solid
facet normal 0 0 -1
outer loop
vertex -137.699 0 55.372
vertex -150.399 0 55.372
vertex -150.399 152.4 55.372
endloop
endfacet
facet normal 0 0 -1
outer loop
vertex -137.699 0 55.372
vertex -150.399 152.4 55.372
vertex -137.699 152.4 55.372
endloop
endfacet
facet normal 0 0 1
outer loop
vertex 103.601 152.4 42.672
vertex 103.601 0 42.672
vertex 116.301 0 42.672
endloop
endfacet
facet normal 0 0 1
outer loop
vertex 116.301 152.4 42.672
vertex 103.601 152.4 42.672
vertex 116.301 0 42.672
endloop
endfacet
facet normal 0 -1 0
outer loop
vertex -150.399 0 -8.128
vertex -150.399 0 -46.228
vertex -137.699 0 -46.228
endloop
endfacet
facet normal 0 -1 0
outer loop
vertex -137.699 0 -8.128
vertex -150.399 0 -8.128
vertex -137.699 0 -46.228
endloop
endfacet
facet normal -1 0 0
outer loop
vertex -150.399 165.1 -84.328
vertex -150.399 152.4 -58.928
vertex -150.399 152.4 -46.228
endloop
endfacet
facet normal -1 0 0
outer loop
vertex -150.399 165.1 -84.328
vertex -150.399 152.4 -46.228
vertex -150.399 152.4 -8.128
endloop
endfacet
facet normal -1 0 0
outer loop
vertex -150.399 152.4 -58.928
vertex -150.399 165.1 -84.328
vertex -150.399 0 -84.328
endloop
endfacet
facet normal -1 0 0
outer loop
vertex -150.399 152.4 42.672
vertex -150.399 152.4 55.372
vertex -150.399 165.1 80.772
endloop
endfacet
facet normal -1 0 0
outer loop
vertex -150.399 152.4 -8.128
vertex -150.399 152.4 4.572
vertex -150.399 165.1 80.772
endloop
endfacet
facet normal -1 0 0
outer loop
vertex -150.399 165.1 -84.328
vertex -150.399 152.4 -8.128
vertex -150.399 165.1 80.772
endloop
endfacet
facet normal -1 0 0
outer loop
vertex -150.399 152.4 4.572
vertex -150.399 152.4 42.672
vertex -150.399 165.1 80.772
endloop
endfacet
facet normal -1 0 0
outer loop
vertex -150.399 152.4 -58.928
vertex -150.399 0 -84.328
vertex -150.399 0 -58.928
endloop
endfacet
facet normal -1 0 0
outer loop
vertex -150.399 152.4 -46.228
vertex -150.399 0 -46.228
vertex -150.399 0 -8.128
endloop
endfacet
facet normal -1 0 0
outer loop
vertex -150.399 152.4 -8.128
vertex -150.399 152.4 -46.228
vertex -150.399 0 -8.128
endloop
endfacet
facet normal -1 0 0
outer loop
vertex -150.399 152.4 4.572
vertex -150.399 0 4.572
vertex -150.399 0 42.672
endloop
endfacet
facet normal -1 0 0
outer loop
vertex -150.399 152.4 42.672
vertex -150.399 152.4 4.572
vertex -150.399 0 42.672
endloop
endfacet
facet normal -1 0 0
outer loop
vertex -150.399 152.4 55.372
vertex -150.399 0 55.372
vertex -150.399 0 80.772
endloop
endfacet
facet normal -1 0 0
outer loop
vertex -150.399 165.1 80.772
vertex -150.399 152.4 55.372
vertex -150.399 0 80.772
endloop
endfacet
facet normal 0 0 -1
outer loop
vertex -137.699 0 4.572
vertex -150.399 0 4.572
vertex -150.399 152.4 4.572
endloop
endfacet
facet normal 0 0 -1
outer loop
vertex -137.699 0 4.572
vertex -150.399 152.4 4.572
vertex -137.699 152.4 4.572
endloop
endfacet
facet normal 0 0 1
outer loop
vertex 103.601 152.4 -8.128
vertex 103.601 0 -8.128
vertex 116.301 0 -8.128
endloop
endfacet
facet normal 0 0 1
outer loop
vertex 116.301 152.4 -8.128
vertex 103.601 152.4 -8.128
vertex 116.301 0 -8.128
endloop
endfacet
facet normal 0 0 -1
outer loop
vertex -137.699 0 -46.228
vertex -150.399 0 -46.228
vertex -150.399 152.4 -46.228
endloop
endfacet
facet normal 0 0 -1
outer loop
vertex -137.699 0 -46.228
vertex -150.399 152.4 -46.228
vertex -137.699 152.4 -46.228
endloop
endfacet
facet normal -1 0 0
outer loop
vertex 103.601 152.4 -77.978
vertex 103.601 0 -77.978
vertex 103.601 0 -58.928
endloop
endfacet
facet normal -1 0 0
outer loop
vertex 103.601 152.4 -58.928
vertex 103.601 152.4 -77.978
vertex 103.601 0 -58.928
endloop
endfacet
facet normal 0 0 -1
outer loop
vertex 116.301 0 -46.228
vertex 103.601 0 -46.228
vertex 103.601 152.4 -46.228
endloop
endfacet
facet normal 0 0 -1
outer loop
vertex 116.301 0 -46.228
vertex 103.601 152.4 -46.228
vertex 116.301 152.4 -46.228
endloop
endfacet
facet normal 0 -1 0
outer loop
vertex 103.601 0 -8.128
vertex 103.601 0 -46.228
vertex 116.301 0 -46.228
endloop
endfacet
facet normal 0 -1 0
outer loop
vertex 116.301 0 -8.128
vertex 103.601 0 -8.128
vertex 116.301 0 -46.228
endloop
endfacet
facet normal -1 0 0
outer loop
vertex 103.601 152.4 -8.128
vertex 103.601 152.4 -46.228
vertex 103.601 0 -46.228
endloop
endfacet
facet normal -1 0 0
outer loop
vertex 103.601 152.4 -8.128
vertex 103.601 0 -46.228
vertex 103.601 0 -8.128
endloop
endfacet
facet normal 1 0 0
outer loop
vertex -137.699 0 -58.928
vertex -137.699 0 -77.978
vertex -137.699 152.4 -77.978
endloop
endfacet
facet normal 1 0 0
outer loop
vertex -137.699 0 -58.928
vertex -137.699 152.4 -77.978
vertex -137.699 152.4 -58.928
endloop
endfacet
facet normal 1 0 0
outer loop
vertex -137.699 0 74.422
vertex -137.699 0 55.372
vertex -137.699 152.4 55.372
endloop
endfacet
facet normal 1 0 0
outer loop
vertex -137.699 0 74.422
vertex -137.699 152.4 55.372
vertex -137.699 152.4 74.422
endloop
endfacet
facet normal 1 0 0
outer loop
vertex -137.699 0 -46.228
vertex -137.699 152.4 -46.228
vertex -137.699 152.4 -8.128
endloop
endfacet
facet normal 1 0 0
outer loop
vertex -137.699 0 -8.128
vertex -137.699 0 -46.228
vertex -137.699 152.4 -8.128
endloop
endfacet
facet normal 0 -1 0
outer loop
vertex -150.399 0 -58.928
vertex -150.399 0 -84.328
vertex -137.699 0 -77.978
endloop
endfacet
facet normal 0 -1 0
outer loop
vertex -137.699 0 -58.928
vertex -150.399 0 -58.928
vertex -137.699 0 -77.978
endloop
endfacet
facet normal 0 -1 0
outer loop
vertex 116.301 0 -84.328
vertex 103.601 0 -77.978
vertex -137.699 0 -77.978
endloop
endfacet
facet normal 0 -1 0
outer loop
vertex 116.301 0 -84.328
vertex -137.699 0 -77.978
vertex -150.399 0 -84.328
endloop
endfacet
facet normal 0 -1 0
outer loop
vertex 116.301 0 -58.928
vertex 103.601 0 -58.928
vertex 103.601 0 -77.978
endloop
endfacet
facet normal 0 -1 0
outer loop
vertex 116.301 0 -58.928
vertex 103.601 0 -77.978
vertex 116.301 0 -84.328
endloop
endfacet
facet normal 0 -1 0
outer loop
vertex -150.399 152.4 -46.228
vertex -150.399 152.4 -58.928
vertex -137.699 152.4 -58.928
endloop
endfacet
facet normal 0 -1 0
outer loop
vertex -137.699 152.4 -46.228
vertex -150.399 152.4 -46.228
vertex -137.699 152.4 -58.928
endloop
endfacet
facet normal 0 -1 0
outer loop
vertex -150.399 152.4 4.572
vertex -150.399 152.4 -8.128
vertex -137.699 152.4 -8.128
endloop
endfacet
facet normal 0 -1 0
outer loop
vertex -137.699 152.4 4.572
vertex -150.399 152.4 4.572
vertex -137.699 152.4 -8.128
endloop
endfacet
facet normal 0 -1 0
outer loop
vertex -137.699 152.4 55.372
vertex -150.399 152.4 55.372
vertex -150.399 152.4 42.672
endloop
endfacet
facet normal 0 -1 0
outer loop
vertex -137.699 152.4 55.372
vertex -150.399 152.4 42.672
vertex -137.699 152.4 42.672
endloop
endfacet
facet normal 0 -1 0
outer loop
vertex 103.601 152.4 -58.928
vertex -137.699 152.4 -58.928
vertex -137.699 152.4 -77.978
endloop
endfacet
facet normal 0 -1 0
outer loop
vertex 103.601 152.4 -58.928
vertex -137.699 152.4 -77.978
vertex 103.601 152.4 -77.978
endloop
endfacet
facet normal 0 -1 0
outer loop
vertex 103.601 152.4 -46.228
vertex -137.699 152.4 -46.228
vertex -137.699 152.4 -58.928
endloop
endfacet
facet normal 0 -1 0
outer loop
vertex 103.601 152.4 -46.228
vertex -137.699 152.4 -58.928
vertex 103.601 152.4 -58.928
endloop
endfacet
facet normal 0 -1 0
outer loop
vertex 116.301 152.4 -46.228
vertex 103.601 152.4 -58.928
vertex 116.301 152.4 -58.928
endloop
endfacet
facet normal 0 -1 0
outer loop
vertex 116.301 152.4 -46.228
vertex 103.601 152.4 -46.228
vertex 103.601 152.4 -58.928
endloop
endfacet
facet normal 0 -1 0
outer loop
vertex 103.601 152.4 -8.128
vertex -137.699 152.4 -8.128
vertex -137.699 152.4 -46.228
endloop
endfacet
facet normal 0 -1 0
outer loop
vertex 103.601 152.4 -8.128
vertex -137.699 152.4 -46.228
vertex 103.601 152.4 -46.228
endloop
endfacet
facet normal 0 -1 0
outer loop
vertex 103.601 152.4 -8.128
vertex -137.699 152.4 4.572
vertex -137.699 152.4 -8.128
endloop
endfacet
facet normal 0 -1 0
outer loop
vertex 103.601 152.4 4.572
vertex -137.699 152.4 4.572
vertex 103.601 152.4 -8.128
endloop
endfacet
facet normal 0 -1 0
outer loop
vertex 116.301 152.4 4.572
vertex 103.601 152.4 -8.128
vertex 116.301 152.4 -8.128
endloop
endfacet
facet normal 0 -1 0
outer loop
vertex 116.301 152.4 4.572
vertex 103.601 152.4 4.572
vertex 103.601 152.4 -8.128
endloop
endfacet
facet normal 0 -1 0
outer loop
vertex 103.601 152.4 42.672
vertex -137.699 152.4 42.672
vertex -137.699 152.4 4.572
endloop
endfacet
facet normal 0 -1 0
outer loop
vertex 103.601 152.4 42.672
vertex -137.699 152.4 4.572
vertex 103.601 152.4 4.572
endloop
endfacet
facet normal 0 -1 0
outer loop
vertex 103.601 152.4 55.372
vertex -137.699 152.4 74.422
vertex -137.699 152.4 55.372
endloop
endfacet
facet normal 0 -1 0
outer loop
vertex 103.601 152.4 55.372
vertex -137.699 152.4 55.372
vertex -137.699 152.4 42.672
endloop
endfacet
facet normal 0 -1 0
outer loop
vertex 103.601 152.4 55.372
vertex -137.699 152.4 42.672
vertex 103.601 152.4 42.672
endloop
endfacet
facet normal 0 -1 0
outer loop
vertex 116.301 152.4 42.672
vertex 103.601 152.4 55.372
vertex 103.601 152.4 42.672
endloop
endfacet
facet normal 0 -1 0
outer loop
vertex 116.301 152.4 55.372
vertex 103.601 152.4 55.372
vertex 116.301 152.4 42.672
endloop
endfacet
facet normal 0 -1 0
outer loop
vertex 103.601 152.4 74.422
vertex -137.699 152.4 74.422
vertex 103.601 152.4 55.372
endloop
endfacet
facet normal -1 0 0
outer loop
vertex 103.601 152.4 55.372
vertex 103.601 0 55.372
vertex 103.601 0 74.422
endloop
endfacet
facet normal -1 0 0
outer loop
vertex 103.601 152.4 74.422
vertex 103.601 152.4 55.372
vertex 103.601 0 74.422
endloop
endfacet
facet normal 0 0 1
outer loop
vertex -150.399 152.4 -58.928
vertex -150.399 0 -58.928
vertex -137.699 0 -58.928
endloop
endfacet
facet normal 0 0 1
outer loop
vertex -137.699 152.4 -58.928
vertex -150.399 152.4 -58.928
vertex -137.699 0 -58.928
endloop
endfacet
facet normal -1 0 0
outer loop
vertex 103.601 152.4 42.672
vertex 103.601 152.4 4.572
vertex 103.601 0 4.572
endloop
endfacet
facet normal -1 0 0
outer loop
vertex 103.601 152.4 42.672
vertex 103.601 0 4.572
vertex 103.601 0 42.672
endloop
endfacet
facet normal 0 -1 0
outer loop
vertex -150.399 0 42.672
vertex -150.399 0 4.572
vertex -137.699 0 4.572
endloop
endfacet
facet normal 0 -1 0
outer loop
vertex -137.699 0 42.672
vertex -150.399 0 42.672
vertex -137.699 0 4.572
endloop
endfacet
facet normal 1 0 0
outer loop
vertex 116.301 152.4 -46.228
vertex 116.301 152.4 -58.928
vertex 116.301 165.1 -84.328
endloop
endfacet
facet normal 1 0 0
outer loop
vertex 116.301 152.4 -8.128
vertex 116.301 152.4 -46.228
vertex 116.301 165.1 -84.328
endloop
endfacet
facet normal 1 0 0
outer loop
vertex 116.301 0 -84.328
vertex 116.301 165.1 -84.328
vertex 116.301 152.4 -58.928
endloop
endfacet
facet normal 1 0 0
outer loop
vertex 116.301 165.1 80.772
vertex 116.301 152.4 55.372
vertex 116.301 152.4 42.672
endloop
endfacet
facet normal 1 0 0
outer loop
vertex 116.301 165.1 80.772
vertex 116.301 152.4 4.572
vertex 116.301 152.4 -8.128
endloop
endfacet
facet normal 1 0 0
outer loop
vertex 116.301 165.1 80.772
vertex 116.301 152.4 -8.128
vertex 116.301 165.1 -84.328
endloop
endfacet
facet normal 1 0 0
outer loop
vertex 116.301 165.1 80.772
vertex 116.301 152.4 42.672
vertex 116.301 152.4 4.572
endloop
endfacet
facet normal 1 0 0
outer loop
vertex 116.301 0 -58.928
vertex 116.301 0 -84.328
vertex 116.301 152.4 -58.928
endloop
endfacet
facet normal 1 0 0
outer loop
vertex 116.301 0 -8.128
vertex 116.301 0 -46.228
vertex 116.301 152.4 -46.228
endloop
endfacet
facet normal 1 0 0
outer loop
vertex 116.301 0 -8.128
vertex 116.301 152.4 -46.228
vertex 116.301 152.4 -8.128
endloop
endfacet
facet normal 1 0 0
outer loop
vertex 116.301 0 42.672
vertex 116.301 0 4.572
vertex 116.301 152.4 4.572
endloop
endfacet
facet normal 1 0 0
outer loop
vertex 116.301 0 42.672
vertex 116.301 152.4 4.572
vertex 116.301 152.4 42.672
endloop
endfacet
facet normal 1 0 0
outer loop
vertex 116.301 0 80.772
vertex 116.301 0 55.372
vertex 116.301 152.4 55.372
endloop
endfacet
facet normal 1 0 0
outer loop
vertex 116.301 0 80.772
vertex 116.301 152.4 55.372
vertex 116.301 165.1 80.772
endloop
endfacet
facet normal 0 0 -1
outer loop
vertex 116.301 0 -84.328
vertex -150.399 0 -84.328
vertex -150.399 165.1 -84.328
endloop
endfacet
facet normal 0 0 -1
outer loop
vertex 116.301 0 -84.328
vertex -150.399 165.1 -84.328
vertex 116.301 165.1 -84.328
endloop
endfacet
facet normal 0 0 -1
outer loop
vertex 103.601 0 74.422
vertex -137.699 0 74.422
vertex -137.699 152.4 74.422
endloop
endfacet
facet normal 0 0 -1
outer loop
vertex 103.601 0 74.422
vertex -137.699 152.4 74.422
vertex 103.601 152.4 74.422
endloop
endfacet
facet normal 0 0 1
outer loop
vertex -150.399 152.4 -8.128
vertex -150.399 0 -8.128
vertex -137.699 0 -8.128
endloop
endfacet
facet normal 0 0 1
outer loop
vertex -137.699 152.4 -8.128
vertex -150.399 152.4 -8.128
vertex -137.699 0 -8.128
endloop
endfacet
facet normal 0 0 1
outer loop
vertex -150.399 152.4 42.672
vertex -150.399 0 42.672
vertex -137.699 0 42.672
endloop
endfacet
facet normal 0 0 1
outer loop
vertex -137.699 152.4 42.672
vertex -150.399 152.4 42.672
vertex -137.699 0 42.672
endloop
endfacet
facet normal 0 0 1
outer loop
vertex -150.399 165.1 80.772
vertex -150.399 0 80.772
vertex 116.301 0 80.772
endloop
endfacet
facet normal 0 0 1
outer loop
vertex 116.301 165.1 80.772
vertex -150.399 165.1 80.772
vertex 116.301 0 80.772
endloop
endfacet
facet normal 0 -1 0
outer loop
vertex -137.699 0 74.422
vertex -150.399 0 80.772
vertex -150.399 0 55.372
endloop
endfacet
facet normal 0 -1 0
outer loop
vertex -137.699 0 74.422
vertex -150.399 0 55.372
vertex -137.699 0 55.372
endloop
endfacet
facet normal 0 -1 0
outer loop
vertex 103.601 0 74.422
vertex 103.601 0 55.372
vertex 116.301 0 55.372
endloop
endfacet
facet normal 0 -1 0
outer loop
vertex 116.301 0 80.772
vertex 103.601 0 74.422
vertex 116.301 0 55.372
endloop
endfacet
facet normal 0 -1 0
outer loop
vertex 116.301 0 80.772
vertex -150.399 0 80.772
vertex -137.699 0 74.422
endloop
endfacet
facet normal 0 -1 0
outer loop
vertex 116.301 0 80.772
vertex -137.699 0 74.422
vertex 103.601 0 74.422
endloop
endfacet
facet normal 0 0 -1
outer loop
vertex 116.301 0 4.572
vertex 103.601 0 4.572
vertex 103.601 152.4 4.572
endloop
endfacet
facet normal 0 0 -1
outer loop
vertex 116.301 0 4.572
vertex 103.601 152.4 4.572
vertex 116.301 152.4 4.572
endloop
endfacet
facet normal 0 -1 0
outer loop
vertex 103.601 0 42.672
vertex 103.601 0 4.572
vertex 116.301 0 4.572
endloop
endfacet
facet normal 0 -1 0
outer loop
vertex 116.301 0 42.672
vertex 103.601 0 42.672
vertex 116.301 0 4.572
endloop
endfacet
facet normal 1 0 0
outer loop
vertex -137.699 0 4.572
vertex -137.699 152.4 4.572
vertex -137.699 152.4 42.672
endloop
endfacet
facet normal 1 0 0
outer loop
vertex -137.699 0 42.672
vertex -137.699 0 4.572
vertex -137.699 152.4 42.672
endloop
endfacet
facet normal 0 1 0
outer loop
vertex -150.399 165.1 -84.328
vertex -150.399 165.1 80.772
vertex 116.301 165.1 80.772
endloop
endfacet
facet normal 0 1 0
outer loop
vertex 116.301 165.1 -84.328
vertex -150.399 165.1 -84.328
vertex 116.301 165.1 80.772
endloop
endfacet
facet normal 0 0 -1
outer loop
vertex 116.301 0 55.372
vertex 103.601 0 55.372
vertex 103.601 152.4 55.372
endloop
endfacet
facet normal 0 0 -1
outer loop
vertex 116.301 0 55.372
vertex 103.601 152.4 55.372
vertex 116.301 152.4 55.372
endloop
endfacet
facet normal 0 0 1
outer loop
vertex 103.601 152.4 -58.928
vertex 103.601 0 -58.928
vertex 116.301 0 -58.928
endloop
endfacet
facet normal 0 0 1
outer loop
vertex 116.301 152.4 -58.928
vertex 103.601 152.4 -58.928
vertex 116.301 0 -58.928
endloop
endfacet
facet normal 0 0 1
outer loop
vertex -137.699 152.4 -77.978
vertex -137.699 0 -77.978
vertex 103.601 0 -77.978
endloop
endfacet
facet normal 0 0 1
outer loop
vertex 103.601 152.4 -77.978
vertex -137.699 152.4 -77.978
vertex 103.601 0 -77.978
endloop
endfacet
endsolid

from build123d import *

# Parameters (mm, degrees)
F0_W     = 266.7
F0_H     = 165.1
F1_DEPTH = 165.1
F2_W     = 241.3
F2_H     = 152.4
F3_DEPTH = 152.4
F4_W     = 12.7
F4_H     = 12.7
F5_DEPTH = 152.4


with BuildPart() as f1:
    # F0 (on Front) → F1 (new body)
    with BuildSketch(Plane.XZ):
        with Locations((-17.048836, -1.777712)):
            Rectangle(F0_W, F0_H)
    extrude(amount=-F1_DEPTH)

    # F2 (on face) → F3 (cut)
    with BuildSketch(Plane.XZ):
        with Locations((-17.048836, -1.777712)):
            Rectangle(F2_W, F2_H)
    extrude(amount=-F3_DEPTH, mode=Mode.SUBTRACT)

    # F4 (on face) → F5 (cut)
    with BuildSketch(Plane.XZ):
        with Locations((-144.048836, -52.577712)):
            Rectangle(F4_W, F4_H)
        with Locations((-144.048836, -1.777712)):
            Rectangle(F4_W, F4_H)
        with Locations((-144.048836, 49.022288)):
            Rectangle(F4_W, F4_H)
        with Locations((109.951164, -52.577712)):
            Rectangle(F4_W, F4_H)
        with Locations((109.951164, -1.777712)):
            Rectangle(F4_W, F4_H)
        with Locations((109.951164, 49.022288)):
            Rectangle(F4_W, F4_H)
    extrude(amount=-F5_DEPTH, mode=Mode.SUBTRACT)


solid = f1.part
